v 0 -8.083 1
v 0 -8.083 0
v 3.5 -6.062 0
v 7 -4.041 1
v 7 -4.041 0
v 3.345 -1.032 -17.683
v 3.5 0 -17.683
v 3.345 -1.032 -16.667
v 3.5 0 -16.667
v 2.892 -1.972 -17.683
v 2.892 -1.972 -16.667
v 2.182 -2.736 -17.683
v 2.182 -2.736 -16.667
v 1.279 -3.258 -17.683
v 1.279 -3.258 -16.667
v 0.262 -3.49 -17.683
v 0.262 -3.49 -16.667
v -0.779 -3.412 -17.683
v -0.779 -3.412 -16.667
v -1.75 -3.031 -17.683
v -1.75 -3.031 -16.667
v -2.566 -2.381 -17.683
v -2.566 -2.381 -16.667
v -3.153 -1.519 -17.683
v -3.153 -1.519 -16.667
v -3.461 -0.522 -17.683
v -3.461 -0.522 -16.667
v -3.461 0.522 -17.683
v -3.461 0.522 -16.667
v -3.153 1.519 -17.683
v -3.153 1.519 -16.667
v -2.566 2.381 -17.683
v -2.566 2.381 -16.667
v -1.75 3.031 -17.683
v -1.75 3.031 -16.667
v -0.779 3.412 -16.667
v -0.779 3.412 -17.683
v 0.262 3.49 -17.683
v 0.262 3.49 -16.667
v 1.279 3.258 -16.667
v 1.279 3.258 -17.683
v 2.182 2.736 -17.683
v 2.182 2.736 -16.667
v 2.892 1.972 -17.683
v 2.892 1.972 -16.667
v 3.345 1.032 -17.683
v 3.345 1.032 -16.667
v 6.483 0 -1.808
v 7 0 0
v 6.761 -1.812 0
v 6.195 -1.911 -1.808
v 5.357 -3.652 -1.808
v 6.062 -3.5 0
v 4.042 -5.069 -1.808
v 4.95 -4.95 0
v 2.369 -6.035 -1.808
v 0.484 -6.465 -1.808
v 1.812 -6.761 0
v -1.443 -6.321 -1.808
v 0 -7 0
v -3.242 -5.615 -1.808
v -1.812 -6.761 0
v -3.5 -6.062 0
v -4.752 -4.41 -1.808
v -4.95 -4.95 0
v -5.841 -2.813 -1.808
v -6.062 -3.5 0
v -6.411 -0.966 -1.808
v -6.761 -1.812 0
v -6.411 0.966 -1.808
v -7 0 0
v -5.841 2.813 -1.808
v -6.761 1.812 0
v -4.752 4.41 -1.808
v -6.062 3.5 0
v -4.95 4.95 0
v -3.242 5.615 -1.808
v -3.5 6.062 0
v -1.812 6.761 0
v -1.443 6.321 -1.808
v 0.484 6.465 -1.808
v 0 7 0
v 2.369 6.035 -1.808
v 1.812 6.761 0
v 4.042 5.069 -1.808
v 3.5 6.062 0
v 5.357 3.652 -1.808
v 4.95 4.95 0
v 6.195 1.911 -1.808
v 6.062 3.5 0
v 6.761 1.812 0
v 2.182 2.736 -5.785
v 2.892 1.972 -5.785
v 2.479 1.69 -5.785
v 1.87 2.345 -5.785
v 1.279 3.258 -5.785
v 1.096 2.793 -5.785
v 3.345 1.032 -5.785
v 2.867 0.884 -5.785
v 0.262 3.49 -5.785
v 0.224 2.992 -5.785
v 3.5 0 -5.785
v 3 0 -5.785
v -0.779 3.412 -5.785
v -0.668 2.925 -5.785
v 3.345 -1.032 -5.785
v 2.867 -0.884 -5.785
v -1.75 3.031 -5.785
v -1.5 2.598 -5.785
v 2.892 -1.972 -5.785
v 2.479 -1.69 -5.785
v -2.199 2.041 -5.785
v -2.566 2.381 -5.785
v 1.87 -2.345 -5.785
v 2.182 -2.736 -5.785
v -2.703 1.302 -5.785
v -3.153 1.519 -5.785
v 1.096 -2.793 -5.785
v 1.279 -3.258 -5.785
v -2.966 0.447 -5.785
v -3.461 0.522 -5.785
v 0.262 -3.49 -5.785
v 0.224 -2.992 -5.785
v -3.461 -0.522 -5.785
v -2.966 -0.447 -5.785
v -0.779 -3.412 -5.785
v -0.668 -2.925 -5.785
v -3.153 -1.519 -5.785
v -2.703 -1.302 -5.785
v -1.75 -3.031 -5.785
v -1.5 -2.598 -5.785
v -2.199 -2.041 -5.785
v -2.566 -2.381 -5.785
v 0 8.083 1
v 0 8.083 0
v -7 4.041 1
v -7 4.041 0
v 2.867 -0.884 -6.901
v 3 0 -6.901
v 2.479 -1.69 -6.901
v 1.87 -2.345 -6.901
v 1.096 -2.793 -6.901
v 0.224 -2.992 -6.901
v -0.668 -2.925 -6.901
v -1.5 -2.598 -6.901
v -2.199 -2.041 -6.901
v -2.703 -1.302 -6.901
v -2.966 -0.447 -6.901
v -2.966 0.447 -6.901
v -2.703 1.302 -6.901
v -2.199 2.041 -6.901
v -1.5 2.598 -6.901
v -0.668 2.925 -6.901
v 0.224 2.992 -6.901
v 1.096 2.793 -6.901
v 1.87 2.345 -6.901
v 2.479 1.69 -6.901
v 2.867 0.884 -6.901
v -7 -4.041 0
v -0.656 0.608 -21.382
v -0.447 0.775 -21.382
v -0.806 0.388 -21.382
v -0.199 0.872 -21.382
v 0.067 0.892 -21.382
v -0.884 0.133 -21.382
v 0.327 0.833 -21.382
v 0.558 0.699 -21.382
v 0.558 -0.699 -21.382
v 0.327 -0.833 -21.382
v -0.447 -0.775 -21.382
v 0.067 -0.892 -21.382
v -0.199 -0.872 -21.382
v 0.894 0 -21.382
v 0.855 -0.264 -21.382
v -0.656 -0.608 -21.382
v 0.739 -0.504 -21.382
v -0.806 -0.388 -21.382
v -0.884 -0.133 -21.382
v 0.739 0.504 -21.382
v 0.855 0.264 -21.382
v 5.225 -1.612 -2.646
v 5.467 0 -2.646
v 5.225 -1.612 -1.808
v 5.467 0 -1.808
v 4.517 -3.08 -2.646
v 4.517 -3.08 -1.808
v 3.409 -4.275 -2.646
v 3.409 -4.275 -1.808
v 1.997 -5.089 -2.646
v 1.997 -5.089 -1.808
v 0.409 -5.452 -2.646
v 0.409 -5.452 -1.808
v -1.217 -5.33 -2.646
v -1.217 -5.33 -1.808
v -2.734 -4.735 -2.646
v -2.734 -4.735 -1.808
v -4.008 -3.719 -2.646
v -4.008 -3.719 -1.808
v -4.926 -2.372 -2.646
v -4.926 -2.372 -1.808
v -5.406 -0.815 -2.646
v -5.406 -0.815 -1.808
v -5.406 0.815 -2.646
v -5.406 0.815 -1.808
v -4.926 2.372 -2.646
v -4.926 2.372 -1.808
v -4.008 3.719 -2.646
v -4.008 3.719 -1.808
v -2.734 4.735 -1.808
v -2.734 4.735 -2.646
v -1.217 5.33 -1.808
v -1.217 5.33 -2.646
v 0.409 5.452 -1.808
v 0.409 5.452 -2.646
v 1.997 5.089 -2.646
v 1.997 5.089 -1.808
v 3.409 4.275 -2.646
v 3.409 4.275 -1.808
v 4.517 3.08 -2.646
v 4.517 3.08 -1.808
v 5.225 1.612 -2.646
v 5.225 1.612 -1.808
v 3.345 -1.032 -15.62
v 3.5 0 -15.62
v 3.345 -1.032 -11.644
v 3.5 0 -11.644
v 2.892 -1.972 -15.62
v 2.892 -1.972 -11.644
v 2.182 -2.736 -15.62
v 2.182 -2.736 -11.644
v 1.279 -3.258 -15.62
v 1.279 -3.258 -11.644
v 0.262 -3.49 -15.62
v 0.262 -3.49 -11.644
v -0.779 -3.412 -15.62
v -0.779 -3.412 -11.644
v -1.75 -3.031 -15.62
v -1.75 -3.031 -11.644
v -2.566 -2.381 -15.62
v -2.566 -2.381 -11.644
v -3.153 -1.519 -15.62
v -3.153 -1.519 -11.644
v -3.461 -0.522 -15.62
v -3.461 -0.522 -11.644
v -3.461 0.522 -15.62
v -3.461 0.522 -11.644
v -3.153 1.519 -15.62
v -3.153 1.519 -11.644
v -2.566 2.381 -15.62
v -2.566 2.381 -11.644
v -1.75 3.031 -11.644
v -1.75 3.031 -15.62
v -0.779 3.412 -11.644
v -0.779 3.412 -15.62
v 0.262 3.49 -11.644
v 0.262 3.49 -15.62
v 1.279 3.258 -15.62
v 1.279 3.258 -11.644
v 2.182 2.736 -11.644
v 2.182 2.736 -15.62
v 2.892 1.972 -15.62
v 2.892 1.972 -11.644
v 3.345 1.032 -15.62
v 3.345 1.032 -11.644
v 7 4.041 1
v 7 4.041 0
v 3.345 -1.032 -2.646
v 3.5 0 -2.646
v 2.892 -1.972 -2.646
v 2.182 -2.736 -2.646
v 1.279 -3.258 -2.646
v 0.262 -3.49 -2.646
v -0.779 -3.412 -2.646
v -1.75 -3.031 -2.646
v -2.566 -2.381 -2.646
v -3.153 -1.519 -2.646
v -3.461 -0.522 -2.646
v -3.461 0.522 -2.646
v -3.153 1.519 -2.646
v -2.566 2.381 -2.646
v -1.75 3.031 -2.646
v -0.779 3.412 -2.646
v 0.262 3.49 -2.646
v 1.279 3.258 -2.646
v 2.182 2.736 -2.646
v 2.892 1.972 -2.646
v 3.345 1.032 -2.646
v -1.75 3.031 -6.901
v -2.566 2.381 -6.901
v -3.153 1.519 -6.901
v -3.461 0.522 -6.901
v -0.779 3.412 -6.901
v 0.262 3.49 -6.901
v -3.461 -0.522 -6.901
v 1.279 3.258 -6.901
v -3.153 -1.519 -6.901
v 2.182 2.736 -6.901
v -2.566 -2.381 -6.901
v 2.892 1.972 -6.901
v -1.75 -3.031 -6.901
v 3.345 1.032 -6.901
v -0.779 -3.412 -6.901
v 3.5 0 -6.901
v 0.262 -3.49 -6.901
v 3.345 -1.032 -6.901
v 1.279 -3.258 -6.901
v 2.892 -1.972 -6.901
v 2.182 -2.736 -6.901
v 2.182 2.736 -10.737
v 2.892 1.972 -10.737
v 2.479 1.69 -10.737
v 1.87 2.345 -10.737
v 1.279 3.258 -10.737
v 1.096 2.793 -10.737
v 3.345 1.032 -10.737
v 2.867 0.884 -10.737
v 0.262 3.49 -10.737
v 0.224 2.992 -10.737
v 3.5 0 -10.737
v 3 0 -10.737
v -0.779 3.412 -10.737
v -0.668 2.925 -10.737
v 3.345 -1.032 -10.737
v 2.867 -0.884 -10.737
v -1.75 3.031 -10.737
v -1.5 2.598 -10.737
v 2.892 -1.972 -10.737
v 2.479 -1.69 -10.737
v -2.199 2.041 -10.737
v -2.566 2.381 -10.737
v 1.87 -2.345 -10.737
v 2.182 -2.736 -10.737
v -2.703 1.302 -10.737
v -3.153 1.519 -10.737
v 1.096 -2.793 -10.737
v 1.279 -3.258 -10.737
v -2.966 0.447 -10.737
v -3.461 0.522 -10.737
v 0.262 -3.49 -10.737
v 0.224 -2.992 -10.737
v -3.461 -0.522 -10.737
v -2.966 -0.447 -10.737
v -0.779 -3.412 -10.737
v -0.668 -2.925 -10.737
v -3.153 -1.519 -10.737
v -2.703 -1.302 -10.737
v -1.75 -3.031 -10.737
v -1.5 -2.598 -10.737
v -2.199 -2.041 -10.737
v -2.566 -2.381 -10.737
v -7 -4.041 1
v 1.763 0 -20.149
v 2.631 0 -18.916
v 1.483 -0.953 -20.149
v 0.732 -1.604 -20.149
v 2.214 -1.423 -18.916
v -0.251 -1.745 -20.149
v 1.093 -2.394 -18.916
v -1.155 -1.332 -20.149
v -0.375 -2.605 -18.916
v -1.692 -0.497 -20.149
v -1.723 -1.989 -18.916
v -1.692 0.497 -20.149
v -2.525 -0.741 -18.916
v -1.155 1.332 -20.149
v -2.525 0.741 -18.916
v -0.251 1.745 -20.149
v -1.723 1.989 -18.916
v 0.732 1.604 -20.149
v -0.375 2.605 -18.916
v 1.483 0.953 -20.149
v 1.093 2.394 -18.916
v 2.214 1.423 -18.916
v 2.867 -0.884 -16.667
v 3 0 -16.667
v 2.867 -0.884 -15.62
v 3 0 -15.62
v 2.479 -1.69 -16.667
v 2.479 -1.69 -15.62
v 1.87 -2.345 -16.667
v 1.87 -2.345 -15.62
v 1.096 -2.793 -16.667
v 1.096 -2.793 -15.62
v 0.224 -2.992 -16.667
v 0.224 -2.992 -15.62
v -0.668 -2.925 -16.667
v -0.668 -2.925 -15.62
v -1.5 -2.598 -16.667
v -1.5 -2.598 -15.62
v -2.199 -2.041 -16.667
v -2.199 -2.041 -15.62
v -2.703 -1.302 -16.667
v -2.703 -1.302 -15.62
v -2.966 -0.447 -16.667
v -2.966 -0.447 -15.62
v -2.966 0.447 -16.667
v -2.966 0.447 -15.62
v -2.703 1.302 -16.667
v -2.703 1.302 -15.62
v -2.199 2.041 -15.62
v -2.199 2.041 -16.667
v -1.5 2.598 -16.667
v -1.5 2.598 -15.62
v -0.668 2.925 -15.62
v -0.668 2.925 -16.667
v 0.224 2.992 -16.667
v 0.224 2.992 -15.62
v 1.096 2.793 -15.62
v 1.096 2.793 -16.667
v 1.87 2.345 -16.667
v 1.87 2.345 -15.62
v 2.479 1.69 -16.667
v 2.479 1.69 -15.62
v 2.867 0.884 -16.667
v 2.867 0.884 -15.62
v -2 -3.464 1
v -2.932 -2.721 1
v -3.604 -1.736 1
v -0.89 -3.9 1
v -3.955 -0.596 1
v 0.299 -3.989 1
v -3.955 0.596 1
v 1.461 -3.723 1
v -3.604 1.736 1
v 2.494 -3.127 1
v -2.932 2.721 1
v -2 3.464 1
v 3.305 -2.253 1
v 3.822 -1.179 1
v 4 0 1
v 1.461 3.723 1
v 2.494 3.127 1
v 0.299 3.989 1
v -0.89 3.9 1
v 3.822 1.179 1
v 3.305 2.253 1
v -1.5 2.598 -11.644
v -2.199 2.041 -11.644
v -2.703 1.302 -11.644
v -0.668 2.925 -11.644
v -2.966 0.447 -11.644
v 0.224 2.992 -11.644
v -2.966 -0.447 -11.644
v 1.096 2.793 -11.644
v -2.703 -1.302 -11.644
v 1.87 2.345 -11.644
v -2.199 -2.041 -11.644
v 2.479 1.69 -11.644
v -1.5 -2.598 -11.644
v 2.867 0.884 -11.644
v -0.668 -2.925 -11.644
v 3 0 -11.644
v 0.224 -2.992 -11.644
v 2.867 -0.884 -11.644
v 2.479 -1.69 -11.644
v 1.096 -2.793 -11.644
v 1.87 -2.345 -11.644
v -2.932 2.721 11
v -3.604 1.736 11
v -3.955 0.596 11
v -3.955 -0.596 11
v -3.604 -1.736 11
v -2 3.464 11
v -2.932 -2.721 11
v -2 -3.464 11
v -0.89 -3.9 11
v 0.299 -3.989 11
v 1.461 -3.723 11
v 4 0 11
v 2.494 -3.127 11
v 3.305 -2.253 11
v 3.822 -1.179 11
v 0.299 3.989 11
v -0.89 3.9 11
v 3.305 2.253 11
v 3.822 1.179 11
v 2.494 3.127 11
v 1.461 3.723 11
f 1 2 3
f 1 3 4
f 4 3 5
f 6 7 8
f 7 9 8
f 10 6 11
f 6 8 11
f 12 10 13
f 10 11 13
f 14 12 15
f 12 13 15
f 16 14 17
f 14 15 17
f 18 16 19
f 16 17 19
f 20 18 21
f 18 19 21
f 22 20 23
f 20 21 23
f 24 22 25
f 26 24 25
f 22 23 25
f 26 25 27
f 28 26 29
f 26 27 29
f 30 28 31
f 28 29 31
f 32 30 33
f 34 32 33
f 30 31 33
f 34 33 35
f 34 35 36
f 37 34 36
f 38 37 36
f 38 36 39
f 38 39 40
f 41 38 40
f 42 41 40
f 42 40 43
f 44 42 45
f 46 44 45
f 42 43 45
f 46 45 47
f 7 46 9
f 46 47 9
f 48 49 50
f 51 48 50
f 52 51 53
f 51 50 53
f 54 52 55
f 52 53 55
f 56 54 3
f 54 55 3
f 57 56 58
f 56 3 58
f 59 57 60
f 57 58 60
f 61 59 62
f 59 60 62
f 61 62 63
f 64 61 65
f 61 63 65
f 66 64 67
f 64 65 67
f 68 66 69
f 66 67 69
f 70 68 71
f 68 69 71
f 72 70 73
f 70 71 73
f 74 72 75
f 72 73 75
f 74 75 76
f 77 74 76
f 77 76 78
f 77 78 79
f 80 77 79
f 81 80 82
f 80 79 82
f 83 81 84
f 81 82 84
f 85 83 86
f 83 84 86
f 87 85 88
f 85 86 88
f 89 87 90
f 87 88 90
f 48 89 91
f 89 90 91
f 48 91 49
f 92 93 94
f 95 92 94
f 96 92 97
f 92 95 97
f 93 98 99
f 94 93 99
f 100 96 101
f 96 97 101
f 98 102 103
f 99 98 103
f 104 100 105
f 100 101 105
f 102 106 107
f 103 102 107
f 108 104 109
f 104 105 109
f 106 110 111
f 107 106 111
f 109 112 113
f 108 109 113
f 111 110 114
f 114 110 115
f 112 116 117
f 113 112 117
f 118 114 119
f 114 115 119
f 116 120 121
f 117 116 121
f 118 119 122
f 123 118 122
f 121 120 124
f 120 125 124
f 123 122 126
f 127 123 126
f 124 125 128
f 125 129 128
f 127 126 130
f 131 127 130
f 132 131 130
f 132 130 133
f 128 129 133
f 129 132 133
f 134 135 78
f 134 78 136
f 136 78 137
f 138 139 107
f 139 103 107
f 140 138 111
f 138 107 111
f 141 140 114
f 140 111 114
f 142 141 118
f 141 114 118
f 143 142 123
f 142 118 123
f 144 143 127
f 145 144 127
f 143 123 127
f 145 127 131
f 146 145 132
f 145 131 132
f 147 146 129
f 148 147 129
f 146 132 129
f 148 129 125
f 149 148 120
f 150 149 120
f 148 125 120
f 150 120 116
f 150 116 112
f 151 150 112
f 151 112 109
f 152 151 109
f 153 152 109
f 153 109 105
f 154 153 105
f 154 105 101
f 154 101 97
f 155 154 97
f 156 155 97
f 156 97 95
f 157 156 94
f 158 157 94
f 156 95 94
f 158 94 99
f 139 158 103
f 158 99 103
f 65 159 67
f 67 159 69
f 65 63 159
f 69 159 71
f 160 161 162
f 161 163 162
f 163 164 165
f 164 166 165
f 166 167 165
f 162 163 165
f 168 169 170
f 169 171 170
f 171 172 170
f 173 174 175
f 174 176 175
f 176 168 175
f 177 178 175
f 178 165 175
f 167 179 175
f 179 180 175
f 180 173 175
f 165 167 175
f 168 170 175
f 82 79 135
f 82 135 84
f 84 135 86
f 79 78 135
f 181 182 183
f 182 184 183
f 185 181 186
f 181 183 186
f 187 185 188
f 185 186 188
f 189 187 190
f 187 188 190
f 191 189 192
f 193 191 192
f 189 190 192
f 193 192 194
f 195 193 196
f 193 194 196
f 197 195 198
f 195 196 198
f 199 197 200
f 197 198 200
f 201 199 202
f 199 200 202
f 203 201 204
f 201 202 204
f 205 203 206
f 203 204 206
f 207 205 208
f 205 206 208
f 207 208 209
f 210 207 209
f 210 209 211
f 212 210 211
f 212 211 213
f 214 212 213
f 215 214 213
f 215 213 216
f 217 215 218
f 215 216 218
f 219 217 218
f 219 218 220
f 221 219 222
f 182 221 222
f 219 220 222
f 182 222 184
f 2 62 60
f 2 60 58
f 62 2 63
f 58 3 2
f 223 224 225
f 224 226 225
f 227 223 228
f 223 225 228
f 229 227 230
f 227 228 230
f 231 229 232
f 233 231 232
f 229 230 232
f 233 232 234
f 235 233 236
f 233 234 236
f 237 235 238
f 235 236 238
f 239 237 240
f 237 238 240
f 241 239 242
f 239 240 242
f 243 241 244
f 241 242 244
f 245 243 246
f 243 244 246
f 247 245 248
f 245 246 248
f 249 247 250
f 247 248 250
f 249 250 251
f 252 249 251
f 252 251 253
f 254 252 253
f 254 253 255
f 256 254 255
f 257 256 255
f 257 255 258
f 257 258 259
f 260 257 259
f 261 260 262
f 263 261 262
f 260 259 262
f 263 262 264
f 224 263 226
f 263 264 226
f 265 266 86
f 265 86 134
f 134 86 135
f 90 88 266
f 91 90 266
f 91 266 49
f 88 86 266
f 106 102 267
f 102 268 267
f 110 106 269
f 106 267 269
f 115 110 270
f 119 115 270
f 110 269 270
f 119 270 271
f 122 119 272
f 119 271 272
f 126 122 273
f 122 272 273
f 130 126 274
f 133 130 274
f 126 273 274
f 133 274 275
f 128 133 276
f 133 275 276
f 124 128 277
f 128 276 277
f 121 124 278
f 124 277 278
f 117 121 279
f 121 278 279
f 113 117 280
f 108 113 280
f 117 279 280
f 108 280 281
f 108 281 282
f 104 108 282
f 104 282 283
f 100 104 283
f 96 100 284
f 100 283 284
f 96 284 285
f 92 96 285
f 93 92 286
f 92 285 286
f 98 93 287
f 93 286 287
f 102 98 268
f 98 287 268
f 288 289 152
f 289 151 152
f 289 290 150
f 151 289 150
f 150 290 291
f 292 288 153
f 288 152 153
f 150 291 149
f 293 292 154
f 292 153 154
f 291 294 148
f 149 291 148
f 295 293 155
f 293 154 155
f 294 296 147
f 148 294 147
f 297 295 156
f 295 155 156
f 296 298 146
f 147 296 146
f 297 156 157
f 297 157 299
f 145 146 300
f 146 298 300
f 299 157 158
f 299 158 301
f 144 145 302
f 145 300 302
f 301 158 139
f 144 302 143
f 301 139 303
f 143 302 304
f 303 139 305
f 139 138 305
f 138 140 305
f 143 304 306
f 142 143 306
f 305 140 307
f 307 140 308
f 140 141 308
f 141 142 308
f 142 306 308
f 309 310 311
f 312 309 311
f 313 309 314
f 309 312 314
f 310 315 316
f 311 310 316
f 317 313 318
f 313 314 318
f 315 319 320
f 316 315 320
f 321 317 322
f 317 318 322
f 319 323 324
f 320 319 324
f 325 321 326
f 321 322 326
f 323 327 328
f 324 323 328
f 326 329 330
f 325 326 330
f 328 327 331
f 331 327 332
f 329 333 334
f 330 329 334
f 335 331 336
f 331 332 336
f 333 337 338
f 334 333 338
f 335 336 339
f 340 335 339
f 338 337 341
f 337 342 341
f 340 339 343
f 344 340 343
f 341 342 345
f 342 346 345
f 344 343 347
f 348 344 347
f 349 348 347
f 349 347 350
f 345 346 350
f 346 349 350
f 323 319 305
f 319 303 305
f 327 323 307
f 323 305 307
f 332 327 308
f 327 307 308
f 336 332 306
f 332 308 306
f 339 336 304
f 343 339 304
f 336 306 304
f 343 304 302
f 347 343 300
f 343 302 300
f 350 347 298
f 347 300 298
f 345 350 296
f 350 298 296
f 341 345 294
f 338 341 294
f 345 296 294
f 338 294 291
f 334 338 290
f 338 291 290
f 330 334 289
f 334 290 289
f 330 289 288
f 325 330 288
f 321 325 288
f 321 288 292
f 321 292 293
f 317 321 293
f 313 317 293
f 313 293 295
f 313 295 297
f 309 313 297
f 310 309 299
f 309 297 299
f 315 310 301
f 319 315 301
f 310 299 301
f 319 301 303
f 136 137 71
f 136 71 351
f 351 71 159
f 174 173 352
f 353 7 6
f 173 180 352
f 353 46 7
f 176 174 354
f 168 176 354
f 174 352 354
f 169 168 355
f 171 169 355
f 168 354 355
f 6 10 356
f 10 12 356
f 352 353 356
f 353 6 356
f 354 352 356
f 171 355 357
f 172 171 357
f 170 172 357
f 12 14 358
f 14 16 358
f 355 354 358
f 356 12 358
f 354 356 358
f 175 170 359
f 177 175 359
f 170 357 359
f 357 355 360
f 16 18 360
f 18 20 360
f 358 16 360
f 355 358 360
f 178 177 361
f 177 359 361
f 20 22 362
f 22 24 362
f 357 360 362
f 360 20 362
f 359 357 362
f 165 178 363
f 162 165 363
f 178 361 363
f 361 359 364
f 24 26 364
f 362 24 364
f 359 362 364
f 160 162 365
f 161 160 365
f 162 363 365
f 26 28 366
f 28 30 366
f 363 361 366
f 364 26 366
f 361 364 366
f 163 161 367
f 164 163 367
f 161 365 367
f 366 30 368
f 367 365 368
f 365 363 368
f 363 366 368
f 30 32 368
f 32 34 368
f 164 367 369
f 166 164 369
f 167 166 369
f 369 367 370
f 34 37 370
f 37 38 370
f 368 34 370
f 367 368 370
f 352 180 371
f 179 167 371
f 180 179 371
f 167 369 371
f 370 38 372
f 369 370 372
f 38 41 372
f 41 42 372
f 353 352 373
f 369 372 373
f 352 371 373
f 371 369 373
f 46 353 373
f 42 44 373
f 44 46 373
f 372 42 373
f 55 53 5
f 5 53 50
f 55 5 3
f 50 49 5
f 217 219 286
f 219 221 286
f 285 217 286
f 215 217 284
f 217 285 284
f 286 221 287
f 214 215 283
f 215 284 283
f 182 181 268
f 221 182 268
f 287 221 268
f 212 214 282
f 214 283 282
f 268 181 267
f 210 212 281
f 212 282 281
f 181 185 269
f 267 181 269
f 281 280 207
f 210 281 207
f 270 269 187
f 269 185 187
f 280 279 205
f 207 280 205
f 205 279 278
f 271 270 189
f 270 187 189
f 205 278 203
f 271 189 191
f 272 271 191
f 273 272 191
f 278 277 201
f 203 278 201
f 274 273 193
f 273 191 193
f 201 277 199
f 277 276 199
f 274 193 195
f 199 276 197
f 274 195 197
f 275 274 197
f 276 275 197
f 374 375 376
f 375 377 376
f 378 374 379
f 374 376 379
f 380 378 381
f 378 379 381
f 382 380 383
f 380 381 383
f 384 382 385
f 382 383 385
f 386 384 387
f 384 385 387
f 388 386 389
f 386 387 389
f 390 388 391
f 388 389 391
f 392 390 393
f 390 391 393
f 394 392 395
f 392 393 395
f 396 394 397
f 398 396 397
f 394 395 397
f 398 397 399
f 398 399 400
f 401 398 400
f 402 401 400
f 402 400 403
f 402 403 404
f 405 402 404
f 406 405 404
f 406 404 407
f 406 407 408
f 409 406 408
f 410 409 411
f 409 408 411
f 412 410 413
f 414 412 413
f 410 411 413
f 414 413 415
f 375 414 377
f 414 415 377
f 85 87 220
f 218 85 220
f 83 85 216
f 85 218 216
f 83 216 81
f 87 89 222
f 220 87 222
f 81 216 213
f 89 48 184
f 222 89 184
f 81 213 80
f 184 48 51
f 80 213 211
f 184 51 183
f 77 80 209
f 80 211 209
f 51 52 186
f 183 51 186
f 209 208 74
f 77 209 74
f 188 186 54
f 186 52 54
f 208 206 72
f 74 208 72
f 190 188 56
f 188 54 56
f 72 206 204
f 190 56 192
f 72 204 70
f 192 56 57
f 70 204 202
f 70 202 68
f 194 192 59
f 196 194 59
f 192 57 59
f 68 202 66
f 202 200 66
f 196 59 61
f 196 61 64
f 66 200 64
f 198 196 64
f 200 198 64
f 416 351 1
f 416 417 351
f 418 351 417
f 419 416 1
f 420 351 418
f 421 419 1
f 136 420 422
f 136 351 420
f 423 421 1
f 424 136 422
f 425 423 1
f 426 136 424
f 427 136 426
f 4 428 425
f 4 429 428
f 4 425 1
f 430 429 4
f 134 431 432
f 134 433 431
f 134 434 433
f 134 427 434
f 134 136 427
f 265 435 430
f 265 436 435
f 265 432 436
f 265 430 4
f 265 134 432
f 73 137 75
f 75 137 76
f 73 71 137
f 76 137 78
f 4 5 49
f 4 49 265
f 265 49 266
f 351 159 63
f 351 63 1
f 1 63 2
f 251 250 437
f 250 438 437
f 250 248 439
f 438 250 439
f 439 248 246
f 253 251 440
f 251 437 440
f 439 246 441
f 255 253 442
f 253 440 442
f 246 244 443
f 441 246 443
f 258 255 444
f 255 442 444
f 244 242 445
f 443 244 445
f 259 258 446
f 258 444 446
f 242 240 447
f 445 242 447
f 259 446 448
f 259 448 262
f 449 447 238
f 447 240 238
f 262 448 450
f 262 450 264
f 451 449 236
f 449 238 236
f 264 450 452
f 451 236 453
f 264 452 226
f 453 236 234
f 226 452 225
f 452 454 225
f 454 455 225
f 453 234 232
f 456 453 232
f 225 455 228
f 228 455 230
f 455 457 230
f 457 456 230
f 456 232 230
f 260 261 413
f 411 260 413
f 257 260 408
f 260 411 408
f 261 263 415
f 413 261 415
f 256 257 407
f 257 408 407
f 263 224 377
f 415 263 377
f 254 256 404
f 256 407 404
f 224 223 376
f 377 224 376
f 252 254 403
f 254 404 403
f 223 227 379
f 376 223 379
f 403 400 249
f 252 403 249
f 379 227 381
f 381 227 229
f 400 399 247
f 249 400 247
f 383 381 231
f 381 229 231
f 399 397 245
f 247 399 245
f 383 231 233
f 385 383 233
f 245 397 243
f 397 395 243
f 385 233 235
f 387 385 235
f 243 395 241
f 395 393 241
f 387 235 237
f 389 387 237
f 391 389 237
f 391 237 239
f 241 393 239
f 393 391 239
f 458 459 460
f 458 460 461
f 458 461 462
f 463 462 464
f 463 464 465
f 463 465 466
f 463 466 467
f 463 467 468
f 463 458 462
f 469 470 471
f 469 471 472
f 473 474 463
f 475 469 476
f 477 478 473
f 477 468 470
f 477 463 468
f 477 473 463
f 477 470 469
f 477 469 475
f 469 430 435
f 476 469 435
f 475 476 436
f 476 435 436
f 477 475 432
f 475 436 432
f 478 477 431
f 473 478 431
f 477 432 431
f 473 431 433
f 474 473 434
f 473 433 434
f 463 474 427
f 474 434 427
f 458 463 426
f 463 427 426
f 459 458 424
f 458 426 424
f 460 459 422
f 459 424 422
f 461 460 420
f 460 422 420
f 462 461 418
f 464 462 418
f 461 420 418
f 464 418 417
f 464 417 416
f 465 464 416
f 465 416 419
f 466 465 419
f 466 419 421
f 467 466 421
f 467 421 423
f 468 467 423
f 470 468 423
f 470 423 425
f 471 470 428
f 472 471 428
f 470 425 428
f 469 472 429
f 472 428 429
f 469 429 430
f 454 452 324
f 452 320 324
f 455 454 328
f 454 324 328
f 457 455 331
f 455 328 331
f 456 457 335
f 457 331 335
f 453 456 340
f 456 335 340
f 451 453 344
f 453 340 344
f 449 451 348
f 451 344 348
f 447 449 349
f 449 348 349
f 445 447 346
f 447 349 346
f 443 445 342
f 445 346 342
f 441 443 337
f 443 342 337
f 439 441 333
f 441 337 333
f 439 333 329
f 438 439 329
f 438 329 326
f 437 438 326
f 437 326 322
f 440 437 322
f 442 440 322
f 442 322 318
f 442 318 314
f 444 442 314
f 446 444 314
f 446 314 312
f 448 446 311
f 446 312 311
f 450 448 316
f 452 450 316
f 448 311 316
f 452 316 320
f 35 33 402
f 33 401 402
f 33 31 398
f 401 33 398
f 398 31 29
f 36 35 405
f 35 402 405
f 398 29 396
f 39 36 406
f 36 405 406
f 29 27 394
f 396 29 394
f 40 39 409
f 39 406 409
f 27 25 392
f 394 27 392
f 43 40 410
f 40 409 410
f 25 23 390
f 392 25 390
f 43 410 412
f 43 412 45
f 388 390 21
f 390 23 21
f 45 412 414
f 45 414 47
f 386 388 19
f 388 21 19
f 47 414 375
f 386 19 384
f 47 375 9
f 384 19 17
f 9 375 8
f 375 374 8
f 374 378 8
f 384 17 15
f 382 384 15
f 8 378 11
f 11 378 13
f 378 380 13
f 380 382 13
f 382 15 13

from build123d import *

# Parameters (mm, degrees)
SALIENTE_EXTRUIR1_DEPTH = 1
CROQUIS2_R              = 4
SALIENTE_EXTRUIR2_DEPTH = 10


with BuildPart() as part:
    # Croquis1 → Saliente-Extruir1 (new body)
    with BuildSketch(Plane.XY):
        Polygon((0, -8.082903769), (7, -4.041451884), (7, 4.041451884), (0, 8.082903769), (-7, 4.041451884), (-7, -4.041451884), align=None)
    extrude(amount=SALIENTE_EXTRUIR1_DEPTH)

    # Croquis2 → Saliente-Extruir2 (add)
    with BuildSketch(Plane.XY.offset(1)):
        Circle(CROQUIS2_R)
    extrude(amount=SALIENTE_EXTRUIR2_DEPTH)

    # Croquis3 → Revolución1 (revolve)
    with BuildSketch(Plane(origin=(0, 0, 0), x_dir=(1, 0, 0), z_dir=(0, 1, 0))):
        Polygon((0, 21.382125591), (0.894479356, 21.382125591), (3.5, 17.682529237), (3.5, 16.666829395), (3, 16.666829395), (3, 15.620463348), (3.5, 15.620463348), (3.5, 11.644272372), (3, 11.644272372), (3, 10.737421798), (3.5, 10.737421798), (3.5, 6.900746294), (3, 6.900746294), (3, 5.784622511), (3.5, 5.784622511), (3.5, 2.645524372), (5.467415644, 2.645524372), (5.467415644, 1.808431535), (6.483115486, 1.808431535), (7, 0), (0, 0), align=None)
    revolve(axis=Axis((0, 0, 0), (0, 0, -1)))


solid = part.part
